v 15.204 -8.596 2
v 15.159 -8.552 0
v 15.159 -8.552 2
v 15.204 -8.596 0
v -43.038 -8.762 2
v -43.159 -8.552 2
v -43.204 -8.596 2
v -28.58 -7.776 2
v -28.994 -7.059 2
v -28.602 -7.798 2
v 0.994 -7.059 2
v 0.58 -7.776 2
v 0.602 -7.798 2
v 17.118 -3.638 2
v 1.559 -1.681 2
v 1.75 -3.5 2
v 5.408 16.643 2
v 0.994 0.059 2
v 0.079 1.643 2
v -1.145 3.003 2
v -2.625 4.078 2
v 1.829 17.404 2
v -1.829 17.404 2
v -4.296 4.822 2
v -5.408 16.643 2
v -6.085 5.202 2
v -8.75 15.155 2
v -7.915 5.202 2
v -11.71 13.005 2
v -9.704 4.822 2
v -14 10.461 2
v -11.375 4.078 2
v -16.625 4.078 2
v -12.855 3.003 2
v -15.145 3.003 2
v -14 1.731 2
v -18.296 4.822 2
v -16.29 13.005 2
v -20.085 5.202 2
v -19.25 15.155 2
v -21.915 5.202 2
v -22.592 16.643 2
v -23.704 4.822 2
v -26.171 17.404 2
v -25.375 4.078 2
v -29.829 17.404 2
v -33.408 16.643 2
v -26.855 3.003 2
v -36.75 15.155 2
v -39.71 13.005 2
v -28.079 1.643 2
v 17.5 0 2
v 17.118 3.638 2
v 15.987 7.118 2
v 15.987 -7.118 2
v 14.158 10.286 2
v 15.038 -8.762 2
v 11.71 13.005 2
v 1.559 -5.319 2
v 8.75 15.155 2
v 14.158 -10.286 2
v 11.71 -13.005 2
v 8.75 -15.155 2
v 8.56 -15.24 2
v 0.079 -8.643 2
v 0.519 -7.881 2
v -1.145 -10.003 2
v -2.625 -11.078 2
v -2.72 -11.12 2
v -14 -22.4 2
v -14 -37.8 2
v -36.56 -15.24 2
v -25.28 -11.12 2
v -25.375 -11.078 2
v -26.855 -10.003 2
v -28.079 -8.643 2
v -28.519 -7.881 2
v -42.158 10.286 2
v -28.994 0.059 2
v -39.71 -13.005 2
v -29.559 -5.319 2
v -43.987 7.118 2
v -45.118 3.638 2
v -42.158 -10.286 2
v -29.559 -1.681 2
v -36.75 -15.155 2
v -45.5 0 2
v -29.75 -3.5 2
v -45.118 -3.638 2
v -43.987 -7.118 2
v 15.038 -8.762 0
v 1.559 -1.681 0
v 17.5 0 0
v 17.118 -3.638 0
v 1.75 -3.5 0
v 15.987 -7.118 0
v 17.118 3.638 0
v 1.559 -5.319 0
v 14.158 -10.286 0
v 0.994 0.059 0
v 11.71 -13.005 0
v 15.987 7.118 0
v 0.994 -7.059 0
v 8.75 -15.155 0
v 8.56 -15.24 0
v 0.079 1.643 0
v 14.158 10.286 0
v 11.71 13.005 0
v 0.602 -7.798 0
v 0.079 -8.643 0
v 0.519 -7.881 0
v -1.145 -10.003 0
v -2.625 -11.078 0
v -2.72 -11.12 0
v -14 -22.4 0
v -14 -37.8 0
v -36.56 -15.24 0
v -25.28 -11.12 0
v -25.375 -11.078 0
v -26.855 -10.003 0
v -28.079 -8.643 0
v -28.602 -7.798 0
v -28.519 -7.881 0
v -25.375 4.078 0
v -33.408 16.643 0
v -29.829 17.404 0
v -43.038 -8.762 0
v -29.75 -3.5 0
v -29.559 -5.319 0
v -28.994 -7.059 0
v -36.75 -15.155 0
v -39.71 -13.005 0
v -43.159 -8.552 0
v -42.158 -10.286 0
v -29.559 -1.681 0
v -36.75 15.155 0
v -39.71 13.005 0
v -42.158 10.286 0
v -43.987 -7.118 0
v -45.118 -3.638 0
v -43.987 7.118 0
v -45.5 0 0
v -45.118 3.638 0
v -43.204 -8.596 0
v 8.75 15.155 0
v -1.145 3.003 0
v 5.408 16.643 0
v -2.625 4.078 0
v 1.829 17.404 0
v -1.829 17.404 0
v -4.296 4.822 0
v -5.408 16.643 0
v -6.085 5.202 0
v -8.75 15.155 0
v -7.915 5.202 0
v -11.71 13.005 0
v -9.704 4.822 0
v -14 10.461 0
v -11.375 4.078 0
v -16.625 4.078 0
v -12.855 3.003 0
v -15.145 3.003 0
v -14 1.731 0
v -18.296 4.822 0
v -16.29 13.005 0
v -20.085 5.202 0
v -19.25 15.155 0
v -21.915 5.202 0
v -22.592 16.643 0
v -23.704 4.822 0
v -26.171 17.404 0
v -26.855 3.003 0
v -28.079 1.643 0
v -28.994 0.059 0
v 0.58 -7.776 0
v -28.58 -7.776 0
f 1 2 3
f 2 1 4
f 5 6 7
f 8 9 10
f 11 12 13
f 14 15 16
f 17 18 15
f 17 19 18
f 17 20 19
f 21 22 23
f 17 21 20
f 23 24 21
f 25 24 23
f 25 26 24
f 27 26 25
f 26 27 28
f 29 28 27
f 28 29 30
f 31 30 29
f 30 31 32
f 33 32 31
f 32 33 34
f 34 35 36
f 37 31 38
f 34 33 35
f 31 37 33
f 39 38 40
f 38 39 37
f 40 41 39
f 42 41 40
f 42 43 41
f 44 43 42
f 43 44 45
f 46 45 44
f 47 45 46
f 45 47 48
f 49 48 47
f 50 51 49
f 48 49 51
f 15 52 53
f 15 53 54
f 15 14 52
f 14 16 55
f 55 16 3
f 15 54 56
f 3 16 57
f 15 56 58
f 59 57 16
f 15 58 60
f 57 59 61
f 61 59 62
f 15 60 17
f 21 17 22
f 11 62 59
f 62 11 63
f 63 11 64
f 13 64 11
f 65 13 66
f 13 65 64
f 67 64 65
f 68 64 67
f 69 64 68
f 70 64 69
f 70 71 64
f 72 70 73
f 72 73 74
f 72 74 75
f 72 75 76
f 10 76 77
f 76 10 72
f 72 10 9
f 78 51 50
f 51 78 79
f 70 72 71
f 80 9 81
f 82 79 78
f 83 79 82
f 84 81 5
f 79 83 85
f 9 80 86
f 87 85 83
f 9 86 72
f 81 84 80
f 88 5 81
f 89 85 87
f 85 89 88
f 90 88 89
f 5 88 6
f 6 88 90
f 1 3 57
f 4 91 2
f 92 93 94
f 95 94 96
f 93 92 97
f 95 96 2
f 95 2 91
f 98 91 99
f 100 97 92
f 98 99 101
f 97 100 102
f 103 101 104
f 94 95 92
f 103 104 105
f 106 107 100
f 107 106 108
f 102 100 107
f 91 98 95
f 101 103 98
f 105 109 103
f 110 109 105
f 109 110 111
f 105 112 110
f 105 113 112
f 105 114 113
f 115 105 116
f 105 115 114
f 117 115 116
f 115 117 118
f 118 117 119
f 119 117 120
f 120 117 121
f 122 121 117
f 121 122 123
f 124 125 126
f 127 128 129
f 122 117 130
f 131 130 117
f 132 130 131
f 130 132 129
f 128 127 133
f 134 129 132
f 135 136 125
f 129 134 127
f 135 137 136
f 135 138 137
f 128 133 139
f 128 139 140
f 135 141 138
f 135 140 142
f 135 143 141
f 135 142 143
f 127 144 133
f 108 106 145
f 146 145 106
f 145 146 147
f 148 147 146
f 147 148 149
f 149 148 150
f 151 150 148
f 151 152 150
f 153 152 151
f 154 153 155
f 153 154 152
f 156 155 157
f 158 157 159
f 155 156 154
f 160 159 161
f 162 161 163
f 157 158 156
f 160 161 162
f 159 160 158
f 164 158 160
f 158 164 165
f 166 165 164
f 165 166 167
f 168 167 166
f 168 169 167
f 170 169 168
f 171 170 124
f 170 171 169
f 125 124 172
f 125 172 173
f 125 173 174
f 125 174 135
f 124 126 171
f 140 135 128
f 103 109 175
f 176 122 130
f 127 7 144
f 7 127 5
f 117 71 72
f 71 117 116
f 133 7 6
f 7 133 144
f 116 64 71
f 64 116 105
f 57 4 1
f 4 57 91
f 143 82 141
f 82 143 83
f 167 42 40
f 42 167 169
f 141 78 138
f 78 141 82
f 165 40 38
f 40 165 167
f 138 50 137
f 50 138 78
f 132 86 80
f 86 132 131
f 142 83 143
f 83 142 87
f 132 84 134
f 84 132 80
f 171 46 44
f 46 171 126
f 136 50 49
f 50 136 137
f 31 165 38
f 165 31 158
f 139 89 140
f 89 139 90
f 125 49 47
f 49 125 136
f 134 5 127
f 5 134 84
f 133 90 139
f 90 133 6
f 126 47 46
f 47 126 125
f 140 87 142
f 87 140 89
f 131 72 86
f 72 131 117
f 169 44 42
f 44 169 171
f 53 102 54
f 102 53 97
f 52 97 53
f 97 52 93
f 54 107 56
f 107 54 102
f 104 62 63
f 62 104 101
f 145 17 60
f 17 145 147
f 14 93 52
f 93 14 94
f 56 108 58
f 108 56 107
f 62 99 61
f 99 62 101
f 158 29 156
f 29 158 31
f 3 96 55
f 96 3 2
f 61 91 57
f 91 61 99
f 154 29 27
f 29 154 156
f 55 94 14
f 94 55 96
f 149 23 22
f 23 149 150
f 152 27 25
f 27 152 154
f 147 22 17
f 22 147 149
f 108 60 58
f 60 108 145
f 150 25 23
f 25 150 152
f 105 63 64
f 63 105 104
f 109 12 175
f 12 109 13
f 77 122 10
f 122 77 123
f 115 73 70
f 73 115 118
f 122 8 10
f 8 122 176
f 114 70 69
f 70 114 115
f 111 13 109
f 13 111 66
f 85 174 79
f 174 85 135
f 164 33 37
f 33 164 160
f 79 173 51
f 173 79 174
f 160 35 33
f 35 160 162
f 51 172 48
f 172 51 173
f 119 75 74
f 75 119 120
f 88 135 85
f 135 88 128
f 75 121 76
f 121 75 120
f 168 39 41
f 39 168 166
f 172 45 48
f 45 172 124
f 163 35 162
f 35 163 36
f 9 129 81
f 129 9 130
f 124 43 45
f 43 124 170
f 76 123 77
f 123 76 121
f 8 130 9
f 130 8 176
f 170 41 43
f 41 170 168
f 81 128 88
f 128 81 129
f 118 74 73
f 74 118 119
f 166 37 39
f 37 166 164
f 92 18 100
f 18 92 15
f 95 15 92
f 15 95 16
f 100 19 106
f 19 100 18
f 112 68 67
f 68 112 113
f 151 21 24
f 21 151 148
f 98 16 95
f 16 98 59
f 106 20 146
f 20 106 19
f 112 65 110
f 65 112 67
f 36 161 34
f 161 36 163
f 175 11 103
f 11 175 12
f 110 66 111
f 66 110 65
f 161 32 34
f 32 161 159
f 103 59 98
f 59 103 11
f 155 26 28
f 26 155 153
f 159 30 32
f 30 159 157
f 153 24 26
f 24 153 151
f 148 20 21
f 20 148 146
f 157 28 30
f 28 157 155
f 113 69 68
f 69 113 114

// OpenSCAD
scale([0.7,0.7,1])
difference(){
difference(){
union(){
translate([-40,0,0]) cylinder(2,25,25);
   cylinder(2,25,25);

translate([-20,-54,0]) rotate([0,0,45]) 
difference(){
cube([59,59,2]);
translate([45,45,0]) cube([20,20,2]);
}
}
}
translate([-10,-5,0])
scale([0.5,0.5,1])
difference(){
union(){
translate([-40,0,0]) cylinder(2,25,25);
   cylinder(2,25,25);

translate([-20,-54,0]) rotate([0,0,45]) 
difference(){
cube([59,59,2]);
translate([45,45,0]) cube([20,20,2]);
}
}
}
}
